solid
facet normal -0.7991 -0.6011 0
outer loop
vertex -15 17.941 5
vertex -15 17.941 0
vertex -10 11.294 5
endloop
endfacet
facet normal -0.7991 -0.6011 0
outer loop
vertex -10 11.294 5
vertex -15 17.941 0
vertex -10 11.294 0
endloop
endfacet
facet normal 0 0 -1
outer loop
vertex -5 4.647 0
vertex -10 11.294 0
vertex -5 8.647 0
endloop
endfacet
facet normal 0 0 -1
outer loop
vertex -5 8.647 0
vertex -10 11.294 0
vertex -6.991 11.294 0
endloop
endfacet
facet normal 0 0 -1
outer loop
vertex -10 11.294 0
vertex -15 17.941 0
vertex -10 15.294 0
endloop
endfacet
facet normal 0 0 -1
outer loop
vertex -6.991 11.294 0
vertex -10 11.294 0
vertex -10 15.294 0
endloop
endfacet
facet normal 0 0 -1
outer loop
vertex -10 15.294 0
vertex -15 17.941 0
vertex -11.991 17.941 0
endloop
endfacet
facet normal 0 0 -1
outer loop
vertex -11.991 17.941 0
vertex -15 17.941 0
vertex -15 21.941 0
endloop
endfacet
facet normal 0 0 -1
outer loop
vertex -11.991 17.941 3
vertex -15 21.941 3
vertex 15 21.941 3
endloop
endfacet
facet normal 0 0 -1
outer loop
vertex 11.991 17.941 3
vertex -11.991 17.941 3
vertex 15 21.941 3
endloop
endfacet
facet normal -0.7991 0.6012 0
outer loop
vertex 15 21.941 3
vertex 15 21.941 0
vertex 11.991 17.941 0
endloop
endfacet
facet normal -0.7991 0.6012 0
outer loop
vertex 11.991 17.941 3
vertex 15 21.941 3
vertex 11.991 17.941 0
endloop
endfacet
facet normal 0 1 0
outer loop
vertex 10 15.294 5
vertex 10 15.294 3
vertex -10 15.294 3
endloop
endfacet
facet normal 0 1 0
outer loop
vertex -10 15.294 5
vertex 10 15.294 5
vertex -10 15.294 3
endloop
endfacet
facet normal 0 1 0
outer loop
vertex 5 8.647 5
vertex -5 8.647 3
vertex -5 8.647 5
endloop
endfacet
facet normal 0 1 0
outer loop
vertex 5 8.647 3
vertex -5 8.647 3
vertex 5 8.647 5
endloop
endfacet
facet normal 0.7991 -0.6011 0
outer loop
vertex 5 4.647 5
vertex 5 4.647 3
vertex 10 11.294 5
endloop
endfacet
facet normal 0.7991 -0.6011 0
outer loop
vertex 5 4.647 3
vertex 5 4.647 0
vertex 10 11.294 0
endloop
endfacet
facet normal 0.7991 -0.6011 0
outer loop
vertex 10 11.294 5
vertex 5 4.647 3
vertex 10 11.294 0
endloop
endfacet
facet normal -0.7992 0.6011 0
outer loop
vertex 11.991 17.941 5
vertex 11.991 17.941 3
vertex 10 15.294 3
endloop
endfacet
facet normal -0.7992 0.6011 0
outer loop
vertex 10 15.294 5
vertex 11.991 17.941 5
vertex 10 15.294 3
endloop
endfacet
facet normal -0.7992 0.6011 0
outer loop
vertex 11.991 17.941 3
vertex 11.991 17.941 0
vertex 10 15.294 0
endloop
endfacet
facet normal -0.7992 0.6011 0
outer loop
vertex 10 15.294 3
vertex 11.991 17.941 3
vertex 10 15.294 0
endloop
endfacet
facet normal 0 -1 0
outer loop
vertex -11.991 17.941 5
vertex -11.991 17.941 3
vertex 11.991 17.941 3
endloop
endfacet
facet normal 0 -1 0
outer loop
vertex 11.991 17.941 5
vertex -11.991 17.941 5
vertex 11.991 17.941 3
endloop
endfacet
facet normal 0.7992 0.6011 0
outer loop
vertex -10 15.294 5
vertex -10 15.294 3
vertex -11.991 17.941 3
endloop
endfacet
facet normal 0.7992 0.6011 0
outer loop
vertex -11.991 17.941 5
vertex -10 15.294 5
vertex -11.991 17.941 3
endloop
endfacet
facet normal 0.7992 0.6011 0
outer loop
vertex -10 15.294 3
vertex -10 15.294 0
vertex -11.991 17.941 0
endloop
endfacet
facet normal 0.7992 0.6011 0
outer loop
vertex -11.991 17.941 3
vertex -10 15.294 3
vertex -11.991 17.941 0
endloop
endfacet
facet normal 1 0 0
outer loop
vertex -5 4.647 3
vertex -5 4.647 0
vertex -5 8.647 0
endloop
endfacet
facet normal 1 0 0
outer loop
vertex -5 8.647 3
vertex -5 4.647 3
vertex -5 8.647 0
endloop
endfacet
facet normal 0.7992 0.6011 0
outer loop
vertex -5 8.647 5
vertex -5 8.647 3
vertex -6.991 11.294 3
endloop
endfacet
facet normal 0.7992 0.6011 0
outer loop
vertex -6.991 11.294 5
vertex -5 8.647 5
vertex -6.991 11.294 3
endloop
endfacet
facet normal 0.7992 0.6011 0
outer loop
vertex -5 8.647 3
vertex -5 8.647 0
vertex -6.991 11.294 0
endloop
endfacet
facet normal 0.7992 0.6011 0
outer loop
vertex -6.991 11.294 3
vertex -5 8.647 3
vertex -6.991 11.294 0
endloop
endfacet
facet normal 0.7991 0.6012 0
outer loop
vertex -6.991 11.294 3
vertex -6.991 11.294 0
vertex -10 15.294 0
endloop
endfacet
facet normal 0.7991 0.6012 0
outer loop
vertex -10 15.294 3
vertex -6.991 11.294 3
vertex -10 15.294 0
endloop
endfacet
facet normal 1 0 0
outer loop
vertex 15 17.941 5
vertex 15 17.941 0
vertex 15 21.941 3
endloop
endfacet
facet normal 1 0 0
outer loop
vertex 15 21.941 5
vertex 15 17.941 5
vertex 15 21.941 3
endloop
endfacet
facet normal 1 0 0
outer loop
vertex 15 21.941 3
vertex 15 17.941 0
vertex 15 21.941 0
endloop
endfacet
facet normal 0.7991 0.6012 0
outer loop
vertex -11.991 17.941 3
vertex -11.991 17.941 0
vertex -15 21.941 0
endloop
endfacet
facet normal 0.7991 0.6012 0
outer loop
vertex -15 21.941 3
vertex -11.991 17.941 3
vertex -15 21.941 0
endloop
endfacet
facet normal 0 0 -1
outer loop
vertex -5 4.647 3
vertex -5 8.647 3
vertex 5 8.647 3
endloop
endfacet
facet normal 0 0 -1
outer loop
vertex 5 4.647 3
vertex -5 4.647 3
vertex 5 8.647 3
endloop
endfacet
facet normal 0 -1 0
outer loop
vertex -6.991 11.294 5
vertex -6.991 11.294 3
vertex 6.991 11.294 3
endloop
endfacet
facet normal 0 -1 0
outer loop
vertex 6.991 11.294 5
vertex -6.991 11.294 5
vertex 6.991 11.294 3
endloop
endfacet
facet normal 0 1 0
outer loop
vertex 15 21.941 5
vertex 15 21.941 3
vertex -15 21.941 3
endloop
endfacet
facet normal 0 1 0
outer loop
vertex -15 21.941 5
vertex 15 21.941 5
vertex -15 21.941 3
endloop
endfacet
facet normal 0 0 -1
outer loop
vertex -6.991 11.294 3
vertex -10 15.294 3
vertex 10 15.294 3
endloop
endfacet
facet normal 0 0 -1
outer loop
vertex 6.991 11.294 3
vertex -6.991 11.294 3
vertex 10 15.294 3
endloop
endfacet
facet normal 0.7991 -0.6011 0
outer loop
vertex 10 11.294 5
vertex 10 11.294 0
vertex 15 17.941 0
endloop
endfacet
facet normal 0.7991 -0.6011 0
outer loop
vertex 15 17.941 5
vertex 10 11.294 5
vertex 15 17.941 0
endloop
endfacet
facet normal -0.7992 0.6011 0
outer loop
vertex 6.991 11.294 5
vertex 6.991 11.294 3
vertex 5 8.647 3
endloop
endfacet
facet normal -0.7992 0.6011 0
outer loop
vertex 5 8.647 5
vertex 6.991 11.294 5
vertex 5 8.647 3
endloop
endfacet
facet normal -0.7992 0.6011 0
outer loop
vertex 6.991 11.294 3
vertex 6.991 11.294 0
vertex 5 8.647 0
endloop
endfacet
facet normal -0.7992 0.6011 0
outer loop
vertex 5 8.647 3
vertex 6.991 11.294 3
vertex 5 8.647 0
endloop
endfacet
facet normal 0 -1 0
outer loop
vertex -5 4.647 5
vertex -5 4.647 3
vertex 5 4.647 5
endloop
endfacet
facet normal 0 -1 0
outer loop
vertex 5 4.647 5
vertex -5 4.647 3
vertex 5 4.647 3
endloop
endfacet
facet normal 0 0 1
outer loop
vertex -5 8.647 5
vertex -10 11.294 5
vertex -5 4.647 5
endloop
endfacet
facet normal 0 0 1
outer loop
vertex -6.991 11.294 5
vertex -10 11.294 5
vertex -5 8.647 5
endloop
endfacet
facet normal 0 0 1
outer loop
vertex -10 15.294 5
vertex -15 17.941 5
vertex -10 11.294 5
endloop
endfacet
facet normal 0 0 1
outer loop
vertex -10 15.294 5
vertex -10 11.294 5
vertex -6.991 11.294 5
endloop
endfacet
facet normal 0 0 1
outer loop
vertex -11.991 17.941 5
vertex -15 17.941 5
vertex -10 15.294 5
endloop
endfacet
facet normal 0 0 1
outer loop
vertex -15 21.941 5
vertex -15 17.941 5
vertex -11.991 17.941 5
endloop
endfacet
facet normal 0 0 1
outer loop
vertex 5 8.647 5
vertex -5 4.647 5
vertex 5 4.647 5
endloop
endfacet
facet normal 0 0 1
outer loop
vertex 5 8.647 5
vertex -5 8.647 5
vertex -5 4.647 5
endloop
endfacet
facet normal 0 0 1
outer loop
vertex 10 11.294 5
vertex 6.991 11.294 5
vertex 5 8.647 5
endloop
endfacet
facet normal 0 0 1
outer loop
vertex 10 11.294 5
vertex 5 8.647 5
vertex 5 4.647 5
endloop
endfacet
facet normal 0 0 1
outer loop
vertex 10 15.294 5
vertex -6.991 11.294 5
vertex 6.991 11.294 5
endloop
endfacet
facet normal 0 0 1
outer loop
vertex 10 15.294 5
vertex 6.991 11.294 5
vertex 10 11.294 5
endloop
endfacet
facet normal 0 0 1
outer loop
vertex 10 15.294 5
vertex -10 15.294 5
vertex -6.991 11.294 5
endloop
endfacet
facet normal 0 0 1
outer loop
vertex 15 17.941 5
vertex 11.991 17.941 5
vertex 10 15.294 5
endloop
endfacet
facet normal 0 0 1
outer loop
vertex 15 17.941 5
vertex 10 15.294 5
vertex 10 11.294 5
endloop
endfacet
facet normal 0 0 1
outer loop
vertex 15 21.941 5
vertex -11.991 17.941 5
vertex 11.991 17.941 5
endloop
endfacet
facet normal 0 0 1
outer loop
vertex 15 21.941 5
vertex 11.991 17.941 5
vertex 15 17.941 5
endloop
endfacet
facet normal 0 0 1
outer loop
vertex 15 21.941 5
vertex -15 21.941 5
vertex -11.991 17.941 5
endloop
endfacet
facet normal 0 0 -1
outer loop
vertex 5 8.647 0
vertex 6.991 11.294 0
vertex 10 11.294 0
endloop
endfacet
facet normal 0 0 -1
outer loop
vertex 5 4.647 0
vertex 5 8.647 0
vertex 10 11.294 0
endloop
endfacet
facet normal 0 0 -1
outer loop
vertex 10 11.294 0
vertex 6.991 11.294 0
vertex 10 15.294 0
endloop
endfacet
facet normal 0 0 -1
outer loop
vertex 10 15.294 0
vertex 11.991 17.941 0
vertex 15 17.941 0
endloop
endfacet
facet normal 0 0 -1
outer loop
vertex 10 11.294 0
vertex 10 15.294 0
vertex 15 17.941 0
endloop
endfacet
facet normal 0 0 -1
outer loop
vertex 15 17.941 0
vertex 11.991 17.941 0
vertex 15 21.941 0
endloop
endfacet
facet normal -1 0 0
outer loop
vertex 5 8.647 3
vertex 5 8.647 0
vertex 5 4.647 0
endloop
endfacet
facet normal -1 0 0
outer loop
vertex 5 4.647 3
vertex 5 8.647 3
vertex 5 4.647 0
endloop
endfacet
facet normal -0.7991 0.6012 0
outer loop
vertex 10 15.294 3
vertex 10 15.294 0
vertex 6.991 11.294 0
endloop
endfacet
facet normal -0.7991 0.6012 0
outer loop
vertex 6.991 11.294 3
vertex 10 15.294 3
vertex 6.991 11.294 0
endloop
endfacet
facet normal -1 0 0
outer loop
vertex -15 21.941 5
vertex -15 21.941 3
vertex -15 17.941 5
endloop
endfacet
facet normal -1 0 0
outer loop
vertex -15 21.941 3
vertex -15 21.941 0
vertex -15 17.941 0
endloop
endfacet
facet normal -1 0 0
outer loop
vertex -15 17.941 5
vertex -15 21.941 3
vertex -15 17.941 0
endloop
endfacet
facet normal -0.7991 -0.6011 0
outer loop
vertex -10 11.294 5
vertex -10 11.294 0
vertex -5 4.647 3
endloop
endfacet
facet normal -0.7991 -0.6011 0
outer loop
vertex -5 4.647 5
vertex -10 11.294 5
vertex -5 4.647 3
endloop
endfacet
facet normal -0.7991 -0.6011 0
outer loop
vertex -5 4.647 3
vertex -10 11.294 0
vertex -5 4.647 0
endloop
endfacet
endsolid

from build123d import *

# Parameters (mm, degrees)
F1_DEPTH = 5
F2_START = 3
F0_W     = 10
F0_H     = 4
F2_DEPTH = 2


with BuildPart() as f1:
    # F0 (on Top) → F1 (new body)
    with BuildSketch(Plane.XY):
        Polygon((-15, 21.9410226196), (-15, 17.9410226196), (-11.9911272283, 17.9410226196), align=None)
        Polygon((-11.9911272283, 17.9410226196), (-15, 17.9410226196), (-10, 11.2940150797), (-10, 15.2940150797), align=None)
        Polygon((-10, 15.2940150797), (-10, 11.2940150797), (-6.9911272283, 11.2940150797), align=None)
        Polygon((-6.9911272283, 11.2940150797), (-10, 11.2940150797), (-5, 4.6470075399), (-5, 8.6470075399), align=None)
    extrude(amount=F1_DEPTH)



with BuildPart() as f1b:
    # F0 (on Top) → F1, piece 2 (new body)
    with BuildSketch(Plane.XY):
        Polygon((10, 11.2940150797), (6.9911272283, 11.2940150797), (5, 8.6470075399), (5, 4.6470075399), align=None)
        Polygon((10, 11.2940150797), (10, 15.2940150797), (6.9911272283, 11.2940150797), align=None)
        Polygon((15, 17.9410226196), (11.9911272283, 17.9410226196), (10, 15.2940150797), (10, 11.2940150797), align=None)
        Polygon((15, 21.9410226196), (11.9911272283, 17.9410226196), (15, 17.9410226196), align=None)
    extrude(amount=F1_DEPTH)


with BuildPart() as f1_1:
    add(f1.part)

    add(f1b.part)  # F2 merges F1b
    # F0 (on Top) → F2 (join)
    with BuildSketch(Plane.XY.offset(F2_START)):
        with Locations((0, 6.6470075399)):
            Rectangle(F0_W, F0_H)
        Polygon((10, 15.2940150797), (-10, 15.2940150797), (-6.9911272283, 11.2940150797), (6.9911272283, 11.2940150797), align=None)
        Polygon((-15, 21.9410226196), (-11.9911272283, 17.9410226196), (11.9911272283, 17.9410226196), (15, 21.9410226196), align=None)
    extrude(amount=F2_DEPTH)


solid = f1_1.part
